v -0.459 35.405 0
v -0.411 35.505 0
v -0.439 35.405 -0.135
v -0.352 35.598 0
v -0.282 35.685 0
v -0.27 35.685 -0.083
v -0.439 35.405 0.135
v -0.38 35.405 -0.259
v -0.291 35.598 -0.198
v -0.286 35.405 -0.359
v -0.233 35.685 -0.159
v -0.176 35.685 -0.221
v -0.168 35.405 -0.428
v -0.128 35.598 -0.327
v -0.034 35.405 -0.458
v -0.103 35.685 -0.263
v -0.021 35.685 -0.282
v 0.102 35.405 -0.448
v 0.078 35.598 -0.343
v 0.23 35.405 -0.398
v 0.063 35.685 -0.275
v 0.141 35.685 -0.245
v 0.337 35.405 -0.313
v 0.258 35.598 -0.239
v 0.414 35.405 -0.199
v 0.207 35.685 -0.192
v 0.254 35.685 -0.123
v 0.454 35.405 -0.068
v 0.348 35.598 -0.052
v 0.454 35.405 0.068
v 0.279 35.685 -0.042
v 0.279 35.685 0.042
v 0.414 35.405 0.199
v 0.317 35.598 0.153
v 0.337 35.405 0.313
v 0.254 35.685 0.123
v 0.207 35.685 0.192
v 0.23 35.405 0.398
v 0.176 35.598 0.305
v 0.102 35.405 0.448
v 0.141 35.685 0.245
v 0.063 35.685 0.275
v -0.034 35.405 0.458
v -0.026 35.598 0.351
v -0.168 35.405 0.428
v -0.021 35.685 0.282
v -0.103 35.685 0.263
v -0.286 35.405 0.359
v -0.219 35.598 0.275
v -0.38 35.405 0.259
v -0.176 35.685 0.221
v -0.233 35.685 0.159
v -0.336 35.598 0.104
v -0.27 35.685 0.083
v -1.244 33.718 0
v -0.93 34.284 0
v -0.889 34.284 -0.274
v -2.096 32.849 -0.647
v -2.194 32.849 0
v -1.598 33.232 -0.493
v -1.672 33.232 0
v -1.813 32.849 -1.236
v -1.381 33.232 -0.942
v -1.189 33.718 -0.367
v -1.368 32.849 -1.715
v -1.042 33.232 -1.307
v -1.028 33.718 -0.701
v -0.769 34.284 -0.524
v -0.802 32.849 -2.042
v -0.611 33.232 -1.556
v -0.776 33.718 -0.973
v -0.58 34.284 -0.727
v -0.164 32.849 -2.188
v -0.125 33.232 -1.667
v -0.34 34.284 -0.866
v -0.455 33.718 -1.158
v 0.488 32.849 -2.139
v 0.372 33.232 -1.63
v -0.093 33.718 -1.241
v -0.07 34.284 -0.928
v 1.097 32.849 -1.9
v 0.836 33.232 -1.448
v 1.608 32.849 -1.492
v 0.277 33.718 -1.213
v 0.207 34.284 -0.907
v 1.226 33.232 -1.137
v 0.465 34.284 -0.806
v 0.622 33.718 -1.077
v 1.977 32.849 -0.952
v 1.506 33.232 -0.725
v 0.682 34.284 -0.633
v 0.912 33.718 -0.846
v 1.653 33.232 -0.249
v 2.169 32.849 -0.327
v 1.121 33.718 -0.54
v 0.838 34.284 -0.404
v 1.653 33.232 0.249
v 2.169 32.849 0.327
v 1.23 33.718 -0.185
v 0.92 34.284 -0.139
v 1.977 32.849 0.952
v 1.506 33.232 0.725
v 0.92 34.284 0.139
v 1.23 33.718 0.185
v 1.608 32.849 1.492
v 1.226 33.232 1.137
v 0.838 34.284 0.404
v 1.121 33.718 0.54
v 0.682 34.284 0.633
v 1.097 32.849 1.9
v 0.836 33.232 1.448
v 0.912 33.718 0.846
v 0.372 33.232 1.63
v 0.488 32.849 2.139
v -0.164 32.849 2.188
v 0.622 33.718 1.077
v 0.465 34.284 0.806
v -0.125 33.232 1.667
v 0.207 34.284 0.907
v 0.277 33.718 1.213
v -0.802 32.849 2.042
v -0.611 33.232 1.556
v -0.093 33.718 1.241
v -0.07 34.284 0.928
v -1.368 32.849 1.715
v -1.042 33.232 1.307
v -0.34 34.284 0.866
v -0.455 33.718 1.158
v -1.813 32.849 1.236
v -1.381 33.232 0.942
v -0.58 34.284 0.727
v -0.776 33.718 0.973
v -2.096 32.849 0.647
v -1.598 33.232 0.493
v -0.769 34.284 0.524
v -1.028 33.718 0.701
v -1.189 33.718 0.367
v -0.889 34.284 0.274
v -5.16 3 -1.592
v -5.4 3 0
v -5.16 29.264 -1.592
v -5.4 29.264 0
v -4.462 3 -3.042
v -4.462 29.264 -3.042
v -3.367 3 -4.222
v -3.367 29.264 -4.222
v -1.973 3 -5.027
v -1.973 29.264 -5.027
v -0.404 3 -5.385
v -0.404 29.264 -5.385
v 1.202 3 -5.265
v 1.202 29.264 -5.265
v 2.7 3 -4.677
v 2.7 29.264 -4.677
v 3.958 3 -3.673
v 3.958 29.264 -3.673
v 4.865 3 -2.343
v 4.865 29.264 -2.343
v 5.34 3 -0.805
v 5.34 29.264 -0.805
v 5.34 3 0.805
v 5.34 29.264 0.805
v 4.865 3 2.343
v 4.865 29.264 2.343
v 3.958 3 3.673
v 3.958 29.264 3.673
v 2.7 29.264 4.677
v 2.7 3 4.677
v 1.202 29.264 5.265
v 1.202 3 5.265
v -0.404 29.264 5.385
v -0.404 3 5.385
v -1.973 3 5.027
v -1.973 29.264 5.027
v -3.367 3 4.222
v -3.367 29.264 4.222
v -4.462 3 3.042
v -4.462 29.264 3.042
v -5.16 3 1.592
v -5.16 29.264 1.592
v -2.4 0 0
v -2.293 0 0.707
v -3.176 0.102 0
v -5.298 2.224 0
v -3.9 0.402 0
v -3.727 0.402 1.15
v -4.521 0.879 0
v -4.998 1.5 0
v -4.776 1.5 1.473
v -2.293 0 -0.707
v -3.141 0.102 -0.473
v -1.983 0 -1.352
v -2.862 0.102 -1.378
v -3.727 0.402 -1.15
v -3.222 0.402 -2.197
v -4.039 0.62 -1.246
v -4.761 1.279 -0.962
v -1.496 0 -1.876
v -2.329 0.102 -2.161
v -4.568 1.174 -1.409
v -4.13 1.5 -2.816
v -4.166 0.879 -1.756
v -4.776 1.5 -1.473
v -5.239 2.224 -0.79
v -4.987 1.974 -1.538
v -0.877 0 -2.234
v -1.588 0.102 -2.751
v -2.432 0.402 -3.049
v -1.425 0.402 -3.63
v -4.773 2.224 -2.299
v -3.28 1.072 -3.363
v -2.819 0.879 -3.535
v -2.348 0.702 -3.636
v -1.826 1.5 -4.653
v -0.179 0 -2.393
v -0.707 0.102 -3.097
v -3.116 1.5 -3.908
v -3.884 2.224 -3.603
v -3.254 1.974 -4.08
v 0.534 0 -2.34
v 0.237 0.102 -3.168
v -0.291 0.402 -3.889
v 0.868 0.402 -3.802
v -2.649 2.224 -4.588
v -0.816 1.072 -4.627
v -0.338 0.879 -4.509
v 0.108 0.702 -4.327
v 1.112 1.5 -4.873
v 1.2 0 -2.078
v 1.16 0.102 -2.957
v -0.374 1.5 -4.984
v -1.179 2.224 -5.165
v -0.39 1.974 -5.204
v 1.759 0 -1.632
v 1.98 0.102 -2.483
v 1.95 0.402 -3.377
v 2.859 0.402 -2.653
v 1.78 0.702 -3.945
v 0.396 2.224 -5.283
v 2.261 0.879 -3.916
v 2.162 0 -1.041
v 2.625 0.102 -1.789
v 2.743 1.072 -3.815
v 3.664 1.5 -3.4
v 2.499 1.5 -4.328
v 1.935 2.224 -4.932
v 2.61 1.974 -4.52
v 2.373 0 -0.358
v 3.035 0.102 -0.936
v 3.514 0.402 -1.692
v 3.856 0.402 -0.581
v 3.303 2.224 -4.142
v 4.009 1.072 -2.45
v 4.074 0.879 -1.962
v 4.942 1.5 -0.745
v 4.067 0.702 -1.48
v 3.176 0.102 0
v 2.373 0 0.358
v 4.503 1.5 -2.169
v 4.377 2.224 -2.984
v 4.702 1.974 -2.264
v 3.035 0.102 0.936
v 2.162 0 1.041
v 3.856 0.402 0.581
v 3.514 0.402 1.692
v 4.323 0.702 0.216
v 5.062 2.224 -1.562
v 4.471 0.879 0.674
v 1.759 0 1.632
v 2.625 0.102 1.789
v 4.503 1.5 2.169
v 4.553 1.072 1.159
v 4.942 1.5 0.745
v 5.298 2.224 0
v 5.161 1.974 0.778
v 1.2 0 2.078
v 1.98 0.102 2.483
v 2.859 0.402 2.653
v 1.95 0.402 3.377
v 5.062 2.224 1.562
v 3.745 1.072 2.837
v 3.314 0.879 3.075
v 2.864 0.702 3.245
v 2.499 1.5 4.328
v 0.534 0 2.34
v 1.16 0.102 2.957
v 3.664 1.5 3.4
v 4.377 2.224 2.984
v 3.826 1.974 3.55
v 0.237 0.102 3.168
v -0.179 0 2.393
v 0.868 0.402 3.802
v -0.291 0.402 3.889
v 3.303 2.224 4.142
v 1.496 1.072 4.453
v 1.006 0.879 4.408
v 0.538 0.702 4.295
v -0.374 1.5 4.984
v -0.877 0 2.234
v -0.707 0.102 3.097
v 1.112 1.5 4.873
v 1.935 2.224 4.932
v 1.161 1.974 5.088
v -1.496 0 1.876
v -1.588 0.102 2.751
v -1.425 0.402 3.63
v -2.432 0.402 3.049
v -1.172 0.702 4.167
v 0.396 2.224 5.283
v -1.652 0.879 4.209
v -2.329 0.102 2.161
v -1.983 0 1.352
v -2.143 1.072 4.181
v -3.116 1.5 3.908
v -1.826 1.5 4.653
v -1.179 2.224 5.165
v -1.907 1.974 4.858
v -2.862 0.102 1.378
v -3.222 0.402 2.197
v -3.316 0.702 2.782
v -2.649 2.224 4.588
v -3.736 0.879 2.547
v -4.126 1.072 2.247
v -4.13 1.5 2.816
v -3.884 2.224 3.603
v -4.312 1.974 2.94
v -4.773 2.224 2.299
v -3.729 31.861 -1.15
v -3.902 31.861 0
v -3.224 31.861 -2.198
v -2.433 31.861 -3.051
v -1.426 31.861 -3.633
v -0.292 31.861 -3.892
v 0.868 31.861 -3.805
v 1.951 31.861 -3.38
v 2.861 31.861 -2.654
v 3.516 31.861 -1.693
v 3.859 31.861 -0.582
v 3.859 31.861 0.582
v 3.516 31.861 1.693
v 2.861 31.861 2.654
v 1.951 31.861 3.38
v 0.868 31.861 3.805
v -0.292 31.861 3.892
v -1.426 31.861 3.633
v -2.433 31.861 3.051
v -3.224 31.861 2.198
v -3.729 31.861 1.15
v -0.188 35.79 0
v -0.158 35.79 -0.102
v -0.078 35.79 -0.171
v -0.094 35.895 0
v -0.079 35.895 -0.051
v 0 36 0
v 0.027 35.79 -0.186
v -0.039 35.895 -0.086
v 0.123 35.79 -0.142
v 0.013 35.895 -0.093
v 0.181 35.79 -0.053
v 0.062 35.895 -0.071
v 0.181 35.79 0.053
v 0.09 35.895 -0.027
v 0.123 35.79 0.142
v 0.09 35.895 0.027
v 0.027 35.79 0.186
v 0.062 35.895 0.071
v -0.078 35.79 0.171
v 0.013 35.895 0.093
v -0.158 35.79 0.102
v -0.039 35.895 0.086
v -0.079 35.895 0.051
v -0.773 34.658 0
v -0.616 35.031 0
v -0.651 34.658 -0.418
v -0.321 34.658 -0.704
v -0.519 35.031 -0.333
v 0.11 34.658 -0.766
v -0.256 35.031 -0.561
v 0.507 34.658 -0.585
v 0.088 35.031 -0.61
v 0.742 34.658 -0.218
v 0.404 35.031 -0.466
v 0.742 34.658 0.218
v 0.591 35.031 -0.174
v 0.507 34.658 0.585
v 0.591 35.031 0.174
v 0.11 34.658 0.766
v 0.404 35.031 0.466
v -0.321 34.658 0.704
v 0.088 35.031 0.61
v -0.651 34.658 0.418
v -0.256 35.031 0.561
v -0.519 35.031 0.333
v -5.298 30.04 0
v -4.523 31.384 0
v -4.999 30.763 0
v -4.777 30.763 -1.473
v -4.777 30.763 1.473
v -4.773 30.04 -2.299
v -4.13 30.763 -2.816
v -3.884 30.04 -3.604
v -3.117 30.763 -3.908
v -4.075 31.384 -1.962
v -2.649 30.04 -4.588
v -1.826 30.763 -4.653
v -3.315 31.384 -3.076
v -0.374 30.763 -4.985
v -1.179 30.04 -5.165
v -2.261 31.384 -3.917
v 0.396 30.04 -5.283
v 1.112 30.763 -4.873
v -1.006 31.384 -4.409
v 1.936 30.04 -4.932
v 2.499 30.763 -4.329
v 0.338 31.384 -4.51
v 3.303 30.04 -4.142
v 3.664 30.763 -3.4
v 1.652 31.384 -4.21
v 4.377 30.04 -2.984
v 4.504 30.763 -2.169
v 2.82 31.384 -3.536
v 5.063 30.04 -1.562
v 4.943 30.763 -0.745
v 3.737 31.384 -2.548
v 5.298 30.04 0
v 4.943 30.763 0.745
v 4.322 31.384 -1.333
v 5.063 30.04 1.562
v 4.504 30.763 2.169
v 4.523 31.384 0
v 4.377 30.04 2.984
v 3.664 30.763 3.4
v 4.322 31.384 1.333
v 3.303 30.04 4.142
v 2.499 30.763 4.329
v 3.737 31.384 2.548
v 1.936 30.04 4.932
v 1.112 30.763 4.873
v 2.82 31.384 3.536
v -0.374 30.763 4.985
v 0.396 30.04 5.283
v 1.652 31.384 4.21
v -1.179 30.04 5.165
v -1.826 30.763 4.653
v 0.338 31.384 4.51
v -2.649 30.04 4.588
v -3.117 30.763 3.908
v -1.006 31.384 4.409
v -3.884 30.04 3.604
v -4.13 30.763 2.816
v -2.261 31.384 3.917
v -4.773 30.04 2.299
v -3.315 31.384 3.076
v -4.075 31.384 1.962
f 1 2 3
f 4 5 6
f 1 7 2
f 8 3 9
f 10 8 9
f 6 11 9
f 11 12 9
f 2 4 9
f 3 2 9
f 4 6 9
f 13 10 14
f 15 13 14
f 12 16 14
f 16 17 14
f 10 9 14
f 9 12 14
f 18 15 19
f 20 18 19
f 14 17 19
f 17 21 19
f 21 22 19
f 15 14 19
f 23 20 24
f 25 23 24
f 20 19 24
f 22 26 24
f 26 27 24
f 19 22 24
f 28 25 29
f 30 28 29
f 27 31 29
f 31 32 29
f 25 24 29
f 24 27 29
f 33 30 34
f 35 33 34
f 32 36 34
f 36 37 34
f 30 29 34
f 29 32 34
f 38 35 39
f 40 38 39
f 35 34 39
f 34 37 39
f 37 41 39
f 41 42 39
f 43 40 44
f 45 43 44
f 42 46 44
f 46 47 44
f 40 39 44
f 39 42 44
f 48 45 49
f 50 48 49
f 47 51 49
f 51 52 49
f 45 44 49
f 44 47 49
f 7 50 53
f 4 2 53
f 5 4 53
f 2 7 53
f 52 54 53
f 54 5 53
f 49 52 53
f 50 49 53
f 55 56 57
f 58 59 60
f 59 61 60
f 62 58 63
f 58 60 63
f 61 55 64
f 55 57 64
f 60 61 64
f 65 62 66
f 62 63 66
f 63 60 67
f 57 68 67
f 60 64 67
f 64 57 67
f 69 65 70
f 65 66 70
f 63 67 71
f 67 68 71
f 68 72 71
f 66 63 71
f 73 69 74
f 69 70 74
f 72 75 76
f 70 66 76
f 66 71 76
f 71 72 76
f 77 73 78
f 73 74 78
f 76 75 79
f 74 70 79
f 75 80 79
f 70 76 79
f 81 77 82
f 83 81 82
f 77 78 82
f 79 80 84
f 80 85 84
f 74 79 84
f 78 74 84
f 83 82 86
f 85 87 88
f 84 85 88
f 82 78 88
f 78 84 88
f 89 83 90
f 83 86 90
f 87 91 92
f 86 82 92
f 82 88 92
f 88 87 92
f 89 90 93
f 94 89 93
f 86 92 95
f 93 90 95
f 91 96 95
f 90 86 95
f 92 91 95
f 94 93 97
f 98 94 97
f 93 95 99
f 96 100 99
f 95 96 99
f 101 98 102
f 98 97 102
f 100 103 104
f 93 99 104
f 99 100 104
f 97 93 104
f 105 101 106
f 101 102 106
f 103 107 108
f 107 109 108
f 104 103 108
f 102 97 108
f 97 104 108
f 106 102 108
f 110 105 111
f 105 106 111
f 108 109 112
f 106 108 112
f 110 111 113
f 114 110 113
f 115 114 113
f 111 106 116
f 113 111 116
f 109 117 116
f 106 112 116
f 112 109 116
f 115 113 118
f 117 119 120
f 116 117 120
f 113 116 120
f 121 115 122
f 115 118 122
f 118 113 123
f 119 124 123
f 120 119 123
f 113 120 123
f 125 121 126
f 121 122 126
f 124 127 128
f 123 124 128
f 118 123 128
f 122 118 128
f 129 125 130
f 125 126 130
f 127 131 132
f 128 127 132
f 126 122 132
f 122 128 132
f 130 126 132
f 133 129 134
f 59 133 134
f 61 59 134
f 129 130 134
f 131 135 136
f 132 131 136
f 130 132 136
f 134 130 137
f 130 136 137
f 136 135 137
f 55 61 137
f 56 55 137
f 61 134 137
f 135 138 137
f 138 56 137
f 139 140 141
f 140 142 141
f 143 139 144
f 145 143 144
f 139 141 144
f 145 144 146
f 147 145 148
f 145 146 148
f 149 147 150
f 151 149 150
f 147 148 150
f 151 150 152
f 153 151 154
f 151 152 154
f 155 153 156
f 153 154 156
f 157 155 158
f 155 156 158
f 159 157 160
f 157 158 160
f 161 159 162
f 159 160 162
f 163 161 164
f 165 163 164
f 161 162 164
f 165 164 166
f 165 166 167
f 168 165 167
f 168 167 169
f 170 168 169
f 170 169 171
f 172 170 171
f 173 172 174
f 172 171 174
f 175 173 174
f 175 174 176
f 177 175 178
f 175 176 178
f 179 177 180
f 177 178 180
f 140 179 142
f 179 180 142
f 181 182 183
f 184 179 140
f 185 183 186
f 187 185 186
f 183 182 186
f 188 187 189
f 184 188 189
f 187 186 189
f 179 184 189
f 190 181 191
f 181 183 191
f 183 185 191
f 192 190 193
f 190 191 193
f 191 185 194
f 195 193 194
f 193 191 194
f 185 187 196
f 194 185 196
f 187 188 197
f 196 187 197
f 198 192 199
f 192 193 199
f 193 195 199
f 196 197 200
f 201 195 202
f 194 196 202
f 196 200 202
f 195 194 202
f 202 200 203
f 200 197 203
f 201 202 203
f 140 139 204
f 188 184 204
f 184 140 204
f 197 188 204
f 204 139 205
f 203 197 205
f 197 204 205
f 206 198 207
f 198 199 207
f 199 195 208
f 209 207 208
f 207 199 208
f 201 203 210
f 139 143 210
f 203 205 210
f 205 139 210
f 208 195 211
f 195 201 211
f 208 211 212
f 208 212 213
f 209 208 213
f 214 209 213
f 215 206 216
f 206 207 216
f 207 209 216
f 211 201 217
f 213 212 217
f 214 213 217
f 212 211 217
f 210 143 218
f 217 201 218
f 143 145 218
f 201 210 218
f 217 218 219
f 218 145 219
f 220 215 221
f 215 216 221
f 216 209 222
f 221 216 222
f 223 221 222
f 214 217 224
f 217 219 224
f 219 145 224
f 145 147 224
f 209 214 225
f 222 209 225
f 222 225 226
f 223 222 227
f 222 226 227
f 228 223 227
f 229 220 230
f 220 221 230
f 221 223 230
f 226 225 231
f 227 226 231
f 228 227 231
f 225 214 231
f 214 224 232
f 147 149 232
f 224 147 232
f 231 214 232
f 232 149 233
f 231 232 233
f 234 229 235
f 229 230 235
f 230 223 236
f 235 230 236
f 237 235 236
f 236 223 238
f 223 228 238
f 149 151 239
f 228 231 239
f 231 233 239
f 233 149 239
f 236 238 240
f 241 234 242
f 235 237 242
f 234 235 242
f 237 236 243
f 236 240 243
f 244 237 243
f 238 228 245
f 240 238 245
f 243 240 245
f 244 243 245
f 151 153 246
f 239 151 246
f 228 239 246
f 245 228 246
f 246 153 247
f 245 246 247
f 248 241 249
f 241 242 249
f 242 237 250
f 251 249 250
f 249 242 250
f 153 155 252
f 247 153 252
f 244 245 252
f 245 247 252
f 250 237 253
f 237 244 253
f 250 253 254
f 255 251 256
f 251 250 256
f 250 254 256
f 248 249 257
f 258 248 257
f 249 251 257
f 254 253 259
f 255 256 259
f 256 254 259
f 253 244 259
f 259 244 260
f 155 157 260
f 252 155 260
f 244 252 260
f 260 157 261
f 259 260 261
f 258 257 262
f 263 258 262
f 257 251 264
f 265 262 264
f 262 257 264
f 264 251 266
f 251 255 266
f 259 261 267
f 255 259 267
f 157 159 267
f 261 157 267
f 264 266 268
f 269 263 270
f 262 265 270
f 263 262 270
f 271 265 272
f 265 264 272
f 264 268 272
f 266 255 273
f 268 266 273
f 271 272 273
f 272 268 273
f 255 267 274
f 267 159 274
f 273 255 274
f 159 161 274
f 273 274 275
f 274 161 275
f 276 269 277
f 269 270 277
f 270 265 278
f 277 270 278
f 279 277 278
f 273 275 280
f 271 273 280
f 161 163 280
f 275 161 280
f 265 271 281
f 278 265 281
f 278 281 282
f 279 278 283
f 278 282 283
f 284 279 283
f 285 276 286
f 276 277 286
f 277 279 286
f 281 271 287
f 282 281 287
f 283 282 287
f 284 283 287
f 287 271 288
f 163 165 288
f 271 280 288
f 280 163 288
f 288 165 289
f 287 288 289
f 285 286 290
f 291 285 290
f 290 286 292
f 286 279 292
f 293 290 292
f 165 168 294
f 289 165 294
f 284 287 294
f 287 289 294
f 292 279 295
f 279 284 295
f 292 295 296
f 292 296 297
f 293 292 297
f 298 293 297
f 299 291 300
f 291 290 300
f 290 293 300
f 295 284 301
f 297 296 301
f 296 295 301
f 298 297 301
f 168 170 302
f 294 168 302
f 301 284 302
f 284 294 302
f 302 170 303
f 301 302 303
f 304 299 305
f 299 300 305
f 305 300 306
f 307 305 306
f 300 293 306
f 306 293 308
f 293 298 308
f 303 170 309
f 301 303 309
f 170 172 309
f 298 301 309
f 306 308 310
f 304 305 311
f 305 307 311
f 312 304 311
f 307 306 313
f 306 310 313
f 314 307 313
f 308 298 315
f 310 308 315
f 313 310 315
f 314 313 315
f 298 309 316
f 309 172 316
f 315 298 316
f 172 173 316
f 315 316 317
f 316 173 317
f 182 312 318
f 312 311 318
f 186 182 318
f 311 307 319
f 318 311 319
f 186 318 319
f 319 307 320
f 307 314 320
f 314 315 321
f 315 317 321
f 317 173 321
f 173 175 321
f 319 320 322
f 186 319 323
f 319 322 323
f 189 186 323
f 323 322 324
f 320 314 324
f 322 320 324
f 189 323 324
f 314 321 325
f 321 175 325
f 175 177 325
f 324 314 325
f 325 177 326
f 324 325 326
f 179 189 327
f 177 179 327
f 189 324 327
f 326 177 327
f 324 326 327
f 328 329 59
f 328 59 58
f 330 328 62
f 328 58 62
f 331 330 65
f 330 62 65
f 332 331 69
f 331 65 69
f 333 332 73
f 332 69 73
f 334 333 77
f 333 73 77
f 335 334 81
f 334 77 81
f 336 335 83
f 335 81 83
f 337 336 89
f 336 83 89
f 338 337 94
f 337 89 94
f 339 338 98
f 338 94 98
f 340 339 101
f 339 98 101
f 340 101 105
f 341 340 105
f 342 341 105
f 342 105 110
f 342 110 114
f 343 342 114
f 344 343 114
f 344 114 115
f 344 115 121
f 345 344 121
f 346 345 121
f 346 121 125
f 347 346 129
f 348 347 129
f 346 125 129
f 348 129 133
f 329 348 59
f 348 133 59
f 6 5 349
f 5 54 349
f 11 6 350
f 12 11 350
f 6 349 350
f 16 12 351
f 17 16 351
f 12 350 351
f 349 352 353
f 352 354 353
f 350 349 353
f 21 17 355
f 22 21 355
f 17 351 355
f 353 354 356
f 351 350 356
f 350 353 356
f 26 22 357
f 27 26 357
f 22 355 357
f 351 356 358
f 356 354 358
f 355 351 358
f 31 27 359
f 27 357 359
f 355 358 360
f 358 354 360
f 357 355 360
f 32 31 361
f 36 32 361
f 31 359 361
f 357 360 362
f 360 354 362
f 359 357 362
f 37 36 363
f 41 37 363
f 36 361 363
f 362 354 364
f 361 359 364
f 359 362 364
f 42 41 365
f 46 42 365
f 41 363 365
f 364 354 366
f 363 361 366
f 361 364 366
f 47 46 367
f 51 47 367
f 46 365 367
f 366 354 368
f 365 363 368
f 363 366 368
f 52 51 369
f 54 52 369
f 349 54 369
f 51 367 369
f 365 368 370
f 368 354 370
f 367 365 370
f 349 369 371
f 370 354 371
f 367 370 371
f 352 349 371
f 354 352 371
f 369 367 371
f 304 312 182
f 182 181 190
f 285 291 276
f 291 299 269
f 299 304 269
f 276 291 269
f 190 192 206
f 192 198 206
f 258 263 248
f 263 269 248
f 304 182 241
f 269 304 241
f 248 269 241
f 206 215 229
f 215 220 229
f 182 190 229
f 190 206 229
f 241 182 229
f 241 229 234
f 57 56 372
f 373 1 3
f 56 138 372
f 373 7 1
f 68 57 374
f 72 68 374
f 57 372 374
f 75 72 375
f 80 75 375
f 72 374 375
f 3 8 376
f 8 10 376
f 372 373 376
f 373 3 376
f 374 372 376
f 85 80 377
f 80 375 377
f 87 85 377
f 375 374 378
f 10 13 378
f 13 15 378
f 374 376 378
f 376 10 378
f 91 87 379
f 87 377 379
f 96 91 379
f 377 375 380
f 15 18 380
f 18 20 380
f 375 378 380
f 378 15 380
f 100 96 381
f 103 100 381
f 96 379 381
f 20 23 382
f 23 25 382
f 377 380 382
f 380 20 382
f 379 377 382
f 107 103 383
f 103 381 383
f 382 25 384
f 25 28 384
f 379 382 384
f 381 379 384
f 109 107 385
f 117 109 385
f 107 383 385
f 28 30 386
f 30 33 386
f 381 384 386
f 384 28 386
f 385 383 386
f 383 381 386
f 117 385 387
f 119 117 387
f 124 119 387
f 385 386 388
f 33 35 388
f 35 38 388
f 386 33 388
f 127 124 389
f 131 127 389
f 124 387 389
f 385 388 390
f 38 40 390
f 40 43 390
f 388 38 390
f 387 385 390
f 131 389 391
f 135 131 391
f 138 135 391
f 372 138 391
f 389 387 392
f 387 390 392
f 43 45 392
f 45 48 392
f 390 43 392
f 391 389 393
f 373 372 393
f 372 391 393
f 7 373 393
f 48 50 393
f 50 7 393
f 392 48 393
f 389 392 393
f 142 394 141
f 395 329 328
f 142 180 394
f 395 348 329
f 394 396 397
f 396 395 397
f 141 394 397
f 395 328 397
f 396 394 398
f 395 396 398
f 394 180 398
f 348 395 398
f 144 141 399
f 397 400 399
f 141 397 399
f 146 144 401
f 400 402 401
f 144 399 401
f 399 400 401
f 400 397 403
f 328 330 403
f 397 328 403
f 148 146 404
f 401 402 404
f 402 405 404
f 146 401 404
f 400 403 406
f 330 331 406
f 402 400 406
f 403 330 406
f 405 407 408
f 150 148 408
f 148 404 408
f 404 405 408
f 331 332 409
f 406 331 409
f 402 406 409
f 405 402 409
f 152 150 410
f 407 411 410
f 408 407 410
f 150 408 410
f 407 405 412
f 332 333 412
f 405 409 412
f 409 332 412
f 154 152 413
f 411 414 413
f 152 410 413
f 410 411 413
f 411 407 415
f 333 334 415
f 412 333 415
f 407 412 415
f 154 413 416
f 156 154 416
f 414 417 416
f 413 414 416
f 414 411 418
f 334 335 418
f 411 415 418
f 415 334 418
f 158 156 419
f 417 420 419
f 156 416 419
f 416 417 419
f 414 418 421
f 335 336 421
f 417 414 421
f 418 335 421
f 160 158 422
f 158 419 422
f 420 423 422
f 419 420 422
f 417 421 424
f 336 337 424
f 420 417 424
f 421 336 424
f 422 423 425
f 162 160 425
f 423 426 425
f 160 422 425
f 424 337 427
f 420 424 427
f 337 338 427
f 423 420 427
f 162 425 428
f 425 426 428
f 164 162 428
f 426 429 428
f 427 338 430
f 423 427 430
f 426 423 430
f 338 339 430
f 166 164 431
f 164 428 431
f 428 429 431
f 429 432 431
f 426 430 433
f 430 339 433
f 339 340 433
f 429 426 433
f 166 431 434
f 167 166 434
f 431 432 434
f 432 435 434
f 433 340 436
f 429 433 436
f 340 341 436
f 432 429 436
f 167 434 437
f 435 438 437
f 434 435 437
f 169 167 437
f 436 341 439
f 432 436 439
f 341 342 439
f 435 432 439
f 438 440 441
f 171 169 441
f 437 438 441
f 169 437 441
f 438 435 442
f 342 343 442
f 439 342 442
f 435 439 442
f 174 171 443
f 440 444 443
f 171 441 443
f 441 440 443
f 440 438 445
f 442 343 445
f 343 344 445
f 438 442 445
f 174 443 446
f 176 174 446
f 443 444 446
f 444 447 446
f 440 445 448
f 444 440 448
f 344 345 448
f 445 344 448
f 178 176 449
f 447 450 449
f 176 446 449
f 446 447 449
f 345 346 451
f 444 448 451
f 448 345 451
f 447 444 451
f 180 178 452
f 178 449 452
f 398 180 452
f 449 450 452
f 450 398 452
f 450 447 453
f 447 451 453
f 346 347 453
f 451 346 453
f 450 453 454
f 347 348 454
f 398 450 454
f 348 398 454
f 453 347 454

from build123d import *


with BuildPart() as part:
    # Esquisse1 → Révolution1 (revolve)
    with BuildSketch(Plane.XY):
        with BuildLine():
            Line((-3.902413526, 31.860615398), (-2.193843177, 32.849176927))
            ThreePointArc((-2.193843177, 32.849176927), (-1.444814591, 33.46318111), (-0.930447552, 34.283834209))
            Line((-0.930447552, 34.283834209), (-0.459450443, 35.40488518))
            ThreePointArc((-0.459450443, 35.40488518), (-0.382581088, 35.552204227), (-0.282377912, 35.684760339))
            Line((-0.282377912, 35.684760339), (0, 36))
            Line((0, 36), (0, 0))
            Line((0, 0), (-2.4, 0))
            ThreePointArc((-2.4, 0), (-4.521320344, 0.878679656), (-5.4, 3))
            Line((-5.4, 3), (-5.4, 29.263934132))
            ThreePointArc((-5.4, 29.263934132), (-4.998772843, 30.762726883), (-3.902413526, 31.860615398))
        make_face()
    revolve(axis=Axis((0, 36, 0), (0, -1, 0)))


solid = part.part
